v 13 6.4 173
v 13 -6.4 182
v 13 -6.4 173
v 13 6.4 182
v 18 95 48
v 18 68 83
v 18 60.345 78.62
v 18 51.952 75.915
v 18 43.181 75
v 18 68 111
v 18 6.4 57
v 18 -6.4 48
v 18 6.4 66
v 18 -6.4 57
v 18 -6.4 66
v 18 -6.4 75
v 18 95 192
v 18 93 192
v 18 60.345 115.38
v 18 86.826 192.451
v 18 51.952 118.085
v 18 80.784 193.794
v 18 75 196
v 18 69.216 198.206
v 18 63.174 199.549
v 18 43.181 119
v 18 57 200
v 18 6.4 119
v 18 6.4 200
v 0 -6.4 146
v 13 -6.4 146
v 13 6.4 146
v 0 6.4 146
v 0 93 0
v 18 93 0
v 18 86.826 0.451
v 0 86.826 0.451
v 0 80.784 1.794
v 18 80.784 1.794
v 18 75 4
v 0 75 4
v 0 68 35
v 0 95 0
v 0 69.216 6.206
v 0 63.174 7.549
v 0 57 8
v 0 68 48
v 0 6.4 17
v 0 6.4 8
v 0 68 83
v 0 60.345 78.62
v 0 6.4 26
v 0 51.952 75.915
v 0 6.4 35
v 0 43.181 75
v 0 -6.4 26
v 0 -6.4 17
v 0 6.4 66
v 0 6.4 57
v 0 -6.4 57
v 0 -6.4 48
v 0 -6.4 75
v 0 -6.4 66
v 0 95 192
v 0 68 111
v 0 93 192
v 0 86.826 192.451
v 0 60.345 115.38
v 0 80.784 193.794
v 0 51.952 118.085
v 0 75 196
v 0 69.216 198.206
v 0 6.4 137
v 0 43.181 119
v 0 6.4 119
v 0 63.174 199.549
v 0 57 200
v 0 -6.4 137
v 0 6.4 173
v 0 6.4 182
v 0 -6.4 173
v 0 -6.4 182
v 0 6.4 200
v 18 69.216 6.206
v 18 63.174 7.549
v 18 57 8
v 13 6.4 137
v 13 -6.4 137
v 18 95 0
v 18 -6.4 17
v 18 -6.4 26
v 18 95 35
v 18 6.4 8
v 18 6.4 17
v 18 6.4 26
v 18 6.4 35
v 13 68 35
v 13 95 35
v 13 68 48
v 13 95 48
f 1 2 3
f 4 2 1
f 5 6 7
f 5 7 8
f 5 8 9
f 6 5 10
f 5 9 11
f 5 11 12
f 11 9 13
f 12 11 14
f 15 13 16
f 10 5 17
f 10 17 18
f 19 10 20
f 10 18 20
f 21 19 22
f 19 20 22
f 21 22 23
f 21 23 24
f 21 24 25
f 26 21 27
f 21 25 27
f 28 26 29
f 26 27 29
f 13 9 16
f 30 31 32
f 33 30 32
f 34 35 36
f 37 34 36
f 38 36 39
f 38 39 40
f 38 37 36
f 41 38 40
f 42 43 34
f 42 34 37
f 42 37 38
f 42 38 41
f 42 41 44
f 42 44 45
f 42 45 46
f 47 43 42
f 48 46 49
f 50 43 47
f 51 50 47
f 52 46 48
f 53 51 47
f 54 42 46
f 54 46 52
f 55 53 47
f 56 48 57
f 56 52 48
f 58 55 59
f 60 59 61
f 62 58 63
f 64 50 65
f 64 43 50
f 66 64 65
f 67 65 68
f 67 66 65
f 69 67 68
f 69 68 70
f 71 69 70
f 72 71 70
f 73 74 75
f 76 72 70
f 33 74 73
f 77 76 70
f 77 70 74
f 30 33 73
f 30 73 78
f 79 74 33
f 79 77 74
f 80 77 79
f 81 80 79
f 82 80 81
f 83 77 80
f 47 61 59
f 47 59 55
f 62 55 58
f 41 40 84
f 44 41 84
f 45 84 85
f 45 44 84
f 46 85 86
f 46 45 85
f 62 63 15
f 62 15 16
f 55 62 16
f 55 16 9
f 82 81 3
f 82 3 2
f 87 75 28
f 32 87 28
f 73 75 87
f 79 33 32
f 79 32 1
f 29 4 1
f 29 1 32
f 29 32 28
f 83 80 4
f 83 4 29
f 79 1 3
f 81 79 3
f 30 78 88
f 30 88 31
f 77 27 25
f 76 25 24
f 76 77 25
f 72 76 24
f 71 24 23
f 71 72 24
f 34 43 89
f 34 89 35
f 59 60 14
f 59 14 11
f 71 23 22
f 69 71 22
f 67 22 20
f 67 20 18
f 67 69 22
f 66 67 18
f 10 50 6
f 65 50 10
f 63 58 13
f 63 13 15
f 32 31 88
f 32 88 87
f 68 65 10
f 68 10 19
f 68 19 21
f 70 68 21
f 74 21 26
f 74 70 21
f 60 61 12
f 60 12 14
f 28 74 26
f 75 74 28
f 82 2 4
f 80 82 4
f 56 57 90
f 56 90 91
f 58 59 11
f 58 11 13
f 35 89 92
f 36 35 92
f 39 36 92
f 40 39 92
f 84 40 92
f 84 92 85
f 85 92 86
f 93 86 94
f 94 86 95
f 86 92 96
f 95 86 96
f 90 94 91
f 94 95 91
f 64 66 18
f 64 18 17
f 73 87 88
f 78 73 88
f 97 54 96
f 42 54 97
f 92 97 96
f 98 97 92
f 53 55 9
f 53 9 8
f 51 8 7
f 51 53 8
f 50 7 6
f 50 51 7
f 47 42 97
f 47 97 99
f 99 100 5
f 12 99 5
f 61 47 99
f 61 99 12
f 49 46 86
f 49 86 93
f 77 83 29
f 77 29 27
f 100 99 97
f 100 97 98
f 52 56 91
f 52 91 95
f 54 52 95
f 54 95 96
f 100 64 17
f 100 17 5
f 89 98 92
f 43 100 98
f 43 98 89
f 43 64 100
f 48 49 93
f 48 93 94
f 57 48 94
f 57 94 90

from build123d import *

# Parameters (mm, degrees)
PAD_DEPTH       = 18
SKETCH007_W     = 12.8
SKETCH007_H     = 45
POCKET002_DEPTH = 5
SKETCH010_W     = 27
SKETCH010_H     = 13
POCKET005_DEPTH = 5


with BuildPart() as part:
    # Clone2D → Pad (new body)
    with BuildSketch(Plane.YZ):
        with BuildLine():
            ThreePointArc((75, 196), (83.780456, 193.01205), (93, 192))
            Line((93, 192), (95, 192))
            Line((95, 192), (95, 0))
            Line((95, 0), (93, 0))
            ThreePointArc((93, 0), (83.780456, 1.01205), (75, 4))
            ThreePointArc((75, 4), (66.219544, 6.98795), (57, 8))
            Line((57, 8), (6.4, 8))
            Line((6.4, 8), (6.4, 17))
            Line((6.4, 17), (-6.4, 17))
            Line((-6.4, 17), (-6.4, 26))
            Line((-6.4, 26), (6.4, 26))
            Line((6.4, 26), (6.4, 35))
            Line((6.4, 35), (68, 35))
            Line((68, 35), (68, 48))
            Line((68, 48), (-6.4, 48))
            Line((-6.4, 48), (-6.4, 57))
            Line((-6.4, 57), (6.4, 57))
            Line((6.4, 57), (6.4, 66))
            Line((6.4, 66), (-6.4, 66))
            Line((-6.4, 66), (-6.4, 75))
            Line((-6.4, 75), (43.180653, 75))
            ThreePointArc((43.180653, 75), (56.219058, 77.049413), (68, 83))
            Line((68, 83), (68, 111))
            ThreePointArc((68, 111), (56.219058, 116.950587), (43.180653, 119))
            Line((43.180653, 119), (6.4, 119))
            Line((6.4, 119), (6.4, 137))
            Line((6.4, 137), (-6.4, 137))
            Line((-6.4, 137), (-6.4, 146))
            Line((-6.4, 146), (6.4, 146))
            Line((6.4, 146), (6.4, 173))
            Line((6.4, 173), (-6.4, 173))
            Line((-6.4, 173), (-6.4, 182))
            Line((-6.4, 182), (6.4, 182))
            Line((6.4, 182), (6.4, 200))
            Line((6.4, 200), (57, 200))
            ThreePointArc((57, 200), (66.219544, 198.98795), (75, 196))
        make_face()
    extrude(amount=PAD_DEPTH)

    # Sketch007 (on Face38 of Pad) → Pocket002 (cut)
    with BuildSketch(Plane.YZ.offset(18)):
        with Locations((0, 159.5)):
            Rectangle(SKETCH007_W, SKETCH007_H)
    extrude(amount=-POCKET002_DEPTH, mode=Mode.SUBTRACT)

    # Sketch010 (on Face5 of Pocket002) → Pocket005 (cut)
    with BuildSketch(Plane.YZ.offset(18)):
        with Locations((81.5, 41.5)):
            Rectangle(SKETCH010_W, SKETCH010_H)
    extrude(amount=-POCKET005_DEPTH, mode=Mode.SUBTRACT)


solid = part.part
